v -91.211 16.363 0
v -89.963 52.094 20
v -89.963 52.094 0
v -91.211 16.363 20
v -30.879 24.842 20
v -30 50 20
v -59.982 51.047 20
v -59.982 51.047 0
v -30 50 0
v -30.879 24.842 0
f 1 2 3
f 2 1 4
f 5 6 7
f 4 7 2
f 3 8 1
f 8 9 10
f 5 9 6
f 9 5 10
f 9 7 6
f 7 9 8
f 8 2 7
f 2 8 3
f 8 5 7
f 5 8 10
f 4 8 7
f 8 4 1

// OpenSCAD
translate([-30,50,0])
scale([3,3,1])
rotate([0,0,+178]) {
    difference() {
        cube([20, 20, 20]);
        translate([10, 0, -1]) {
            rotate([0,0,50]) {
                cube([30, 30, 30]);
            }
        }
    }
}
